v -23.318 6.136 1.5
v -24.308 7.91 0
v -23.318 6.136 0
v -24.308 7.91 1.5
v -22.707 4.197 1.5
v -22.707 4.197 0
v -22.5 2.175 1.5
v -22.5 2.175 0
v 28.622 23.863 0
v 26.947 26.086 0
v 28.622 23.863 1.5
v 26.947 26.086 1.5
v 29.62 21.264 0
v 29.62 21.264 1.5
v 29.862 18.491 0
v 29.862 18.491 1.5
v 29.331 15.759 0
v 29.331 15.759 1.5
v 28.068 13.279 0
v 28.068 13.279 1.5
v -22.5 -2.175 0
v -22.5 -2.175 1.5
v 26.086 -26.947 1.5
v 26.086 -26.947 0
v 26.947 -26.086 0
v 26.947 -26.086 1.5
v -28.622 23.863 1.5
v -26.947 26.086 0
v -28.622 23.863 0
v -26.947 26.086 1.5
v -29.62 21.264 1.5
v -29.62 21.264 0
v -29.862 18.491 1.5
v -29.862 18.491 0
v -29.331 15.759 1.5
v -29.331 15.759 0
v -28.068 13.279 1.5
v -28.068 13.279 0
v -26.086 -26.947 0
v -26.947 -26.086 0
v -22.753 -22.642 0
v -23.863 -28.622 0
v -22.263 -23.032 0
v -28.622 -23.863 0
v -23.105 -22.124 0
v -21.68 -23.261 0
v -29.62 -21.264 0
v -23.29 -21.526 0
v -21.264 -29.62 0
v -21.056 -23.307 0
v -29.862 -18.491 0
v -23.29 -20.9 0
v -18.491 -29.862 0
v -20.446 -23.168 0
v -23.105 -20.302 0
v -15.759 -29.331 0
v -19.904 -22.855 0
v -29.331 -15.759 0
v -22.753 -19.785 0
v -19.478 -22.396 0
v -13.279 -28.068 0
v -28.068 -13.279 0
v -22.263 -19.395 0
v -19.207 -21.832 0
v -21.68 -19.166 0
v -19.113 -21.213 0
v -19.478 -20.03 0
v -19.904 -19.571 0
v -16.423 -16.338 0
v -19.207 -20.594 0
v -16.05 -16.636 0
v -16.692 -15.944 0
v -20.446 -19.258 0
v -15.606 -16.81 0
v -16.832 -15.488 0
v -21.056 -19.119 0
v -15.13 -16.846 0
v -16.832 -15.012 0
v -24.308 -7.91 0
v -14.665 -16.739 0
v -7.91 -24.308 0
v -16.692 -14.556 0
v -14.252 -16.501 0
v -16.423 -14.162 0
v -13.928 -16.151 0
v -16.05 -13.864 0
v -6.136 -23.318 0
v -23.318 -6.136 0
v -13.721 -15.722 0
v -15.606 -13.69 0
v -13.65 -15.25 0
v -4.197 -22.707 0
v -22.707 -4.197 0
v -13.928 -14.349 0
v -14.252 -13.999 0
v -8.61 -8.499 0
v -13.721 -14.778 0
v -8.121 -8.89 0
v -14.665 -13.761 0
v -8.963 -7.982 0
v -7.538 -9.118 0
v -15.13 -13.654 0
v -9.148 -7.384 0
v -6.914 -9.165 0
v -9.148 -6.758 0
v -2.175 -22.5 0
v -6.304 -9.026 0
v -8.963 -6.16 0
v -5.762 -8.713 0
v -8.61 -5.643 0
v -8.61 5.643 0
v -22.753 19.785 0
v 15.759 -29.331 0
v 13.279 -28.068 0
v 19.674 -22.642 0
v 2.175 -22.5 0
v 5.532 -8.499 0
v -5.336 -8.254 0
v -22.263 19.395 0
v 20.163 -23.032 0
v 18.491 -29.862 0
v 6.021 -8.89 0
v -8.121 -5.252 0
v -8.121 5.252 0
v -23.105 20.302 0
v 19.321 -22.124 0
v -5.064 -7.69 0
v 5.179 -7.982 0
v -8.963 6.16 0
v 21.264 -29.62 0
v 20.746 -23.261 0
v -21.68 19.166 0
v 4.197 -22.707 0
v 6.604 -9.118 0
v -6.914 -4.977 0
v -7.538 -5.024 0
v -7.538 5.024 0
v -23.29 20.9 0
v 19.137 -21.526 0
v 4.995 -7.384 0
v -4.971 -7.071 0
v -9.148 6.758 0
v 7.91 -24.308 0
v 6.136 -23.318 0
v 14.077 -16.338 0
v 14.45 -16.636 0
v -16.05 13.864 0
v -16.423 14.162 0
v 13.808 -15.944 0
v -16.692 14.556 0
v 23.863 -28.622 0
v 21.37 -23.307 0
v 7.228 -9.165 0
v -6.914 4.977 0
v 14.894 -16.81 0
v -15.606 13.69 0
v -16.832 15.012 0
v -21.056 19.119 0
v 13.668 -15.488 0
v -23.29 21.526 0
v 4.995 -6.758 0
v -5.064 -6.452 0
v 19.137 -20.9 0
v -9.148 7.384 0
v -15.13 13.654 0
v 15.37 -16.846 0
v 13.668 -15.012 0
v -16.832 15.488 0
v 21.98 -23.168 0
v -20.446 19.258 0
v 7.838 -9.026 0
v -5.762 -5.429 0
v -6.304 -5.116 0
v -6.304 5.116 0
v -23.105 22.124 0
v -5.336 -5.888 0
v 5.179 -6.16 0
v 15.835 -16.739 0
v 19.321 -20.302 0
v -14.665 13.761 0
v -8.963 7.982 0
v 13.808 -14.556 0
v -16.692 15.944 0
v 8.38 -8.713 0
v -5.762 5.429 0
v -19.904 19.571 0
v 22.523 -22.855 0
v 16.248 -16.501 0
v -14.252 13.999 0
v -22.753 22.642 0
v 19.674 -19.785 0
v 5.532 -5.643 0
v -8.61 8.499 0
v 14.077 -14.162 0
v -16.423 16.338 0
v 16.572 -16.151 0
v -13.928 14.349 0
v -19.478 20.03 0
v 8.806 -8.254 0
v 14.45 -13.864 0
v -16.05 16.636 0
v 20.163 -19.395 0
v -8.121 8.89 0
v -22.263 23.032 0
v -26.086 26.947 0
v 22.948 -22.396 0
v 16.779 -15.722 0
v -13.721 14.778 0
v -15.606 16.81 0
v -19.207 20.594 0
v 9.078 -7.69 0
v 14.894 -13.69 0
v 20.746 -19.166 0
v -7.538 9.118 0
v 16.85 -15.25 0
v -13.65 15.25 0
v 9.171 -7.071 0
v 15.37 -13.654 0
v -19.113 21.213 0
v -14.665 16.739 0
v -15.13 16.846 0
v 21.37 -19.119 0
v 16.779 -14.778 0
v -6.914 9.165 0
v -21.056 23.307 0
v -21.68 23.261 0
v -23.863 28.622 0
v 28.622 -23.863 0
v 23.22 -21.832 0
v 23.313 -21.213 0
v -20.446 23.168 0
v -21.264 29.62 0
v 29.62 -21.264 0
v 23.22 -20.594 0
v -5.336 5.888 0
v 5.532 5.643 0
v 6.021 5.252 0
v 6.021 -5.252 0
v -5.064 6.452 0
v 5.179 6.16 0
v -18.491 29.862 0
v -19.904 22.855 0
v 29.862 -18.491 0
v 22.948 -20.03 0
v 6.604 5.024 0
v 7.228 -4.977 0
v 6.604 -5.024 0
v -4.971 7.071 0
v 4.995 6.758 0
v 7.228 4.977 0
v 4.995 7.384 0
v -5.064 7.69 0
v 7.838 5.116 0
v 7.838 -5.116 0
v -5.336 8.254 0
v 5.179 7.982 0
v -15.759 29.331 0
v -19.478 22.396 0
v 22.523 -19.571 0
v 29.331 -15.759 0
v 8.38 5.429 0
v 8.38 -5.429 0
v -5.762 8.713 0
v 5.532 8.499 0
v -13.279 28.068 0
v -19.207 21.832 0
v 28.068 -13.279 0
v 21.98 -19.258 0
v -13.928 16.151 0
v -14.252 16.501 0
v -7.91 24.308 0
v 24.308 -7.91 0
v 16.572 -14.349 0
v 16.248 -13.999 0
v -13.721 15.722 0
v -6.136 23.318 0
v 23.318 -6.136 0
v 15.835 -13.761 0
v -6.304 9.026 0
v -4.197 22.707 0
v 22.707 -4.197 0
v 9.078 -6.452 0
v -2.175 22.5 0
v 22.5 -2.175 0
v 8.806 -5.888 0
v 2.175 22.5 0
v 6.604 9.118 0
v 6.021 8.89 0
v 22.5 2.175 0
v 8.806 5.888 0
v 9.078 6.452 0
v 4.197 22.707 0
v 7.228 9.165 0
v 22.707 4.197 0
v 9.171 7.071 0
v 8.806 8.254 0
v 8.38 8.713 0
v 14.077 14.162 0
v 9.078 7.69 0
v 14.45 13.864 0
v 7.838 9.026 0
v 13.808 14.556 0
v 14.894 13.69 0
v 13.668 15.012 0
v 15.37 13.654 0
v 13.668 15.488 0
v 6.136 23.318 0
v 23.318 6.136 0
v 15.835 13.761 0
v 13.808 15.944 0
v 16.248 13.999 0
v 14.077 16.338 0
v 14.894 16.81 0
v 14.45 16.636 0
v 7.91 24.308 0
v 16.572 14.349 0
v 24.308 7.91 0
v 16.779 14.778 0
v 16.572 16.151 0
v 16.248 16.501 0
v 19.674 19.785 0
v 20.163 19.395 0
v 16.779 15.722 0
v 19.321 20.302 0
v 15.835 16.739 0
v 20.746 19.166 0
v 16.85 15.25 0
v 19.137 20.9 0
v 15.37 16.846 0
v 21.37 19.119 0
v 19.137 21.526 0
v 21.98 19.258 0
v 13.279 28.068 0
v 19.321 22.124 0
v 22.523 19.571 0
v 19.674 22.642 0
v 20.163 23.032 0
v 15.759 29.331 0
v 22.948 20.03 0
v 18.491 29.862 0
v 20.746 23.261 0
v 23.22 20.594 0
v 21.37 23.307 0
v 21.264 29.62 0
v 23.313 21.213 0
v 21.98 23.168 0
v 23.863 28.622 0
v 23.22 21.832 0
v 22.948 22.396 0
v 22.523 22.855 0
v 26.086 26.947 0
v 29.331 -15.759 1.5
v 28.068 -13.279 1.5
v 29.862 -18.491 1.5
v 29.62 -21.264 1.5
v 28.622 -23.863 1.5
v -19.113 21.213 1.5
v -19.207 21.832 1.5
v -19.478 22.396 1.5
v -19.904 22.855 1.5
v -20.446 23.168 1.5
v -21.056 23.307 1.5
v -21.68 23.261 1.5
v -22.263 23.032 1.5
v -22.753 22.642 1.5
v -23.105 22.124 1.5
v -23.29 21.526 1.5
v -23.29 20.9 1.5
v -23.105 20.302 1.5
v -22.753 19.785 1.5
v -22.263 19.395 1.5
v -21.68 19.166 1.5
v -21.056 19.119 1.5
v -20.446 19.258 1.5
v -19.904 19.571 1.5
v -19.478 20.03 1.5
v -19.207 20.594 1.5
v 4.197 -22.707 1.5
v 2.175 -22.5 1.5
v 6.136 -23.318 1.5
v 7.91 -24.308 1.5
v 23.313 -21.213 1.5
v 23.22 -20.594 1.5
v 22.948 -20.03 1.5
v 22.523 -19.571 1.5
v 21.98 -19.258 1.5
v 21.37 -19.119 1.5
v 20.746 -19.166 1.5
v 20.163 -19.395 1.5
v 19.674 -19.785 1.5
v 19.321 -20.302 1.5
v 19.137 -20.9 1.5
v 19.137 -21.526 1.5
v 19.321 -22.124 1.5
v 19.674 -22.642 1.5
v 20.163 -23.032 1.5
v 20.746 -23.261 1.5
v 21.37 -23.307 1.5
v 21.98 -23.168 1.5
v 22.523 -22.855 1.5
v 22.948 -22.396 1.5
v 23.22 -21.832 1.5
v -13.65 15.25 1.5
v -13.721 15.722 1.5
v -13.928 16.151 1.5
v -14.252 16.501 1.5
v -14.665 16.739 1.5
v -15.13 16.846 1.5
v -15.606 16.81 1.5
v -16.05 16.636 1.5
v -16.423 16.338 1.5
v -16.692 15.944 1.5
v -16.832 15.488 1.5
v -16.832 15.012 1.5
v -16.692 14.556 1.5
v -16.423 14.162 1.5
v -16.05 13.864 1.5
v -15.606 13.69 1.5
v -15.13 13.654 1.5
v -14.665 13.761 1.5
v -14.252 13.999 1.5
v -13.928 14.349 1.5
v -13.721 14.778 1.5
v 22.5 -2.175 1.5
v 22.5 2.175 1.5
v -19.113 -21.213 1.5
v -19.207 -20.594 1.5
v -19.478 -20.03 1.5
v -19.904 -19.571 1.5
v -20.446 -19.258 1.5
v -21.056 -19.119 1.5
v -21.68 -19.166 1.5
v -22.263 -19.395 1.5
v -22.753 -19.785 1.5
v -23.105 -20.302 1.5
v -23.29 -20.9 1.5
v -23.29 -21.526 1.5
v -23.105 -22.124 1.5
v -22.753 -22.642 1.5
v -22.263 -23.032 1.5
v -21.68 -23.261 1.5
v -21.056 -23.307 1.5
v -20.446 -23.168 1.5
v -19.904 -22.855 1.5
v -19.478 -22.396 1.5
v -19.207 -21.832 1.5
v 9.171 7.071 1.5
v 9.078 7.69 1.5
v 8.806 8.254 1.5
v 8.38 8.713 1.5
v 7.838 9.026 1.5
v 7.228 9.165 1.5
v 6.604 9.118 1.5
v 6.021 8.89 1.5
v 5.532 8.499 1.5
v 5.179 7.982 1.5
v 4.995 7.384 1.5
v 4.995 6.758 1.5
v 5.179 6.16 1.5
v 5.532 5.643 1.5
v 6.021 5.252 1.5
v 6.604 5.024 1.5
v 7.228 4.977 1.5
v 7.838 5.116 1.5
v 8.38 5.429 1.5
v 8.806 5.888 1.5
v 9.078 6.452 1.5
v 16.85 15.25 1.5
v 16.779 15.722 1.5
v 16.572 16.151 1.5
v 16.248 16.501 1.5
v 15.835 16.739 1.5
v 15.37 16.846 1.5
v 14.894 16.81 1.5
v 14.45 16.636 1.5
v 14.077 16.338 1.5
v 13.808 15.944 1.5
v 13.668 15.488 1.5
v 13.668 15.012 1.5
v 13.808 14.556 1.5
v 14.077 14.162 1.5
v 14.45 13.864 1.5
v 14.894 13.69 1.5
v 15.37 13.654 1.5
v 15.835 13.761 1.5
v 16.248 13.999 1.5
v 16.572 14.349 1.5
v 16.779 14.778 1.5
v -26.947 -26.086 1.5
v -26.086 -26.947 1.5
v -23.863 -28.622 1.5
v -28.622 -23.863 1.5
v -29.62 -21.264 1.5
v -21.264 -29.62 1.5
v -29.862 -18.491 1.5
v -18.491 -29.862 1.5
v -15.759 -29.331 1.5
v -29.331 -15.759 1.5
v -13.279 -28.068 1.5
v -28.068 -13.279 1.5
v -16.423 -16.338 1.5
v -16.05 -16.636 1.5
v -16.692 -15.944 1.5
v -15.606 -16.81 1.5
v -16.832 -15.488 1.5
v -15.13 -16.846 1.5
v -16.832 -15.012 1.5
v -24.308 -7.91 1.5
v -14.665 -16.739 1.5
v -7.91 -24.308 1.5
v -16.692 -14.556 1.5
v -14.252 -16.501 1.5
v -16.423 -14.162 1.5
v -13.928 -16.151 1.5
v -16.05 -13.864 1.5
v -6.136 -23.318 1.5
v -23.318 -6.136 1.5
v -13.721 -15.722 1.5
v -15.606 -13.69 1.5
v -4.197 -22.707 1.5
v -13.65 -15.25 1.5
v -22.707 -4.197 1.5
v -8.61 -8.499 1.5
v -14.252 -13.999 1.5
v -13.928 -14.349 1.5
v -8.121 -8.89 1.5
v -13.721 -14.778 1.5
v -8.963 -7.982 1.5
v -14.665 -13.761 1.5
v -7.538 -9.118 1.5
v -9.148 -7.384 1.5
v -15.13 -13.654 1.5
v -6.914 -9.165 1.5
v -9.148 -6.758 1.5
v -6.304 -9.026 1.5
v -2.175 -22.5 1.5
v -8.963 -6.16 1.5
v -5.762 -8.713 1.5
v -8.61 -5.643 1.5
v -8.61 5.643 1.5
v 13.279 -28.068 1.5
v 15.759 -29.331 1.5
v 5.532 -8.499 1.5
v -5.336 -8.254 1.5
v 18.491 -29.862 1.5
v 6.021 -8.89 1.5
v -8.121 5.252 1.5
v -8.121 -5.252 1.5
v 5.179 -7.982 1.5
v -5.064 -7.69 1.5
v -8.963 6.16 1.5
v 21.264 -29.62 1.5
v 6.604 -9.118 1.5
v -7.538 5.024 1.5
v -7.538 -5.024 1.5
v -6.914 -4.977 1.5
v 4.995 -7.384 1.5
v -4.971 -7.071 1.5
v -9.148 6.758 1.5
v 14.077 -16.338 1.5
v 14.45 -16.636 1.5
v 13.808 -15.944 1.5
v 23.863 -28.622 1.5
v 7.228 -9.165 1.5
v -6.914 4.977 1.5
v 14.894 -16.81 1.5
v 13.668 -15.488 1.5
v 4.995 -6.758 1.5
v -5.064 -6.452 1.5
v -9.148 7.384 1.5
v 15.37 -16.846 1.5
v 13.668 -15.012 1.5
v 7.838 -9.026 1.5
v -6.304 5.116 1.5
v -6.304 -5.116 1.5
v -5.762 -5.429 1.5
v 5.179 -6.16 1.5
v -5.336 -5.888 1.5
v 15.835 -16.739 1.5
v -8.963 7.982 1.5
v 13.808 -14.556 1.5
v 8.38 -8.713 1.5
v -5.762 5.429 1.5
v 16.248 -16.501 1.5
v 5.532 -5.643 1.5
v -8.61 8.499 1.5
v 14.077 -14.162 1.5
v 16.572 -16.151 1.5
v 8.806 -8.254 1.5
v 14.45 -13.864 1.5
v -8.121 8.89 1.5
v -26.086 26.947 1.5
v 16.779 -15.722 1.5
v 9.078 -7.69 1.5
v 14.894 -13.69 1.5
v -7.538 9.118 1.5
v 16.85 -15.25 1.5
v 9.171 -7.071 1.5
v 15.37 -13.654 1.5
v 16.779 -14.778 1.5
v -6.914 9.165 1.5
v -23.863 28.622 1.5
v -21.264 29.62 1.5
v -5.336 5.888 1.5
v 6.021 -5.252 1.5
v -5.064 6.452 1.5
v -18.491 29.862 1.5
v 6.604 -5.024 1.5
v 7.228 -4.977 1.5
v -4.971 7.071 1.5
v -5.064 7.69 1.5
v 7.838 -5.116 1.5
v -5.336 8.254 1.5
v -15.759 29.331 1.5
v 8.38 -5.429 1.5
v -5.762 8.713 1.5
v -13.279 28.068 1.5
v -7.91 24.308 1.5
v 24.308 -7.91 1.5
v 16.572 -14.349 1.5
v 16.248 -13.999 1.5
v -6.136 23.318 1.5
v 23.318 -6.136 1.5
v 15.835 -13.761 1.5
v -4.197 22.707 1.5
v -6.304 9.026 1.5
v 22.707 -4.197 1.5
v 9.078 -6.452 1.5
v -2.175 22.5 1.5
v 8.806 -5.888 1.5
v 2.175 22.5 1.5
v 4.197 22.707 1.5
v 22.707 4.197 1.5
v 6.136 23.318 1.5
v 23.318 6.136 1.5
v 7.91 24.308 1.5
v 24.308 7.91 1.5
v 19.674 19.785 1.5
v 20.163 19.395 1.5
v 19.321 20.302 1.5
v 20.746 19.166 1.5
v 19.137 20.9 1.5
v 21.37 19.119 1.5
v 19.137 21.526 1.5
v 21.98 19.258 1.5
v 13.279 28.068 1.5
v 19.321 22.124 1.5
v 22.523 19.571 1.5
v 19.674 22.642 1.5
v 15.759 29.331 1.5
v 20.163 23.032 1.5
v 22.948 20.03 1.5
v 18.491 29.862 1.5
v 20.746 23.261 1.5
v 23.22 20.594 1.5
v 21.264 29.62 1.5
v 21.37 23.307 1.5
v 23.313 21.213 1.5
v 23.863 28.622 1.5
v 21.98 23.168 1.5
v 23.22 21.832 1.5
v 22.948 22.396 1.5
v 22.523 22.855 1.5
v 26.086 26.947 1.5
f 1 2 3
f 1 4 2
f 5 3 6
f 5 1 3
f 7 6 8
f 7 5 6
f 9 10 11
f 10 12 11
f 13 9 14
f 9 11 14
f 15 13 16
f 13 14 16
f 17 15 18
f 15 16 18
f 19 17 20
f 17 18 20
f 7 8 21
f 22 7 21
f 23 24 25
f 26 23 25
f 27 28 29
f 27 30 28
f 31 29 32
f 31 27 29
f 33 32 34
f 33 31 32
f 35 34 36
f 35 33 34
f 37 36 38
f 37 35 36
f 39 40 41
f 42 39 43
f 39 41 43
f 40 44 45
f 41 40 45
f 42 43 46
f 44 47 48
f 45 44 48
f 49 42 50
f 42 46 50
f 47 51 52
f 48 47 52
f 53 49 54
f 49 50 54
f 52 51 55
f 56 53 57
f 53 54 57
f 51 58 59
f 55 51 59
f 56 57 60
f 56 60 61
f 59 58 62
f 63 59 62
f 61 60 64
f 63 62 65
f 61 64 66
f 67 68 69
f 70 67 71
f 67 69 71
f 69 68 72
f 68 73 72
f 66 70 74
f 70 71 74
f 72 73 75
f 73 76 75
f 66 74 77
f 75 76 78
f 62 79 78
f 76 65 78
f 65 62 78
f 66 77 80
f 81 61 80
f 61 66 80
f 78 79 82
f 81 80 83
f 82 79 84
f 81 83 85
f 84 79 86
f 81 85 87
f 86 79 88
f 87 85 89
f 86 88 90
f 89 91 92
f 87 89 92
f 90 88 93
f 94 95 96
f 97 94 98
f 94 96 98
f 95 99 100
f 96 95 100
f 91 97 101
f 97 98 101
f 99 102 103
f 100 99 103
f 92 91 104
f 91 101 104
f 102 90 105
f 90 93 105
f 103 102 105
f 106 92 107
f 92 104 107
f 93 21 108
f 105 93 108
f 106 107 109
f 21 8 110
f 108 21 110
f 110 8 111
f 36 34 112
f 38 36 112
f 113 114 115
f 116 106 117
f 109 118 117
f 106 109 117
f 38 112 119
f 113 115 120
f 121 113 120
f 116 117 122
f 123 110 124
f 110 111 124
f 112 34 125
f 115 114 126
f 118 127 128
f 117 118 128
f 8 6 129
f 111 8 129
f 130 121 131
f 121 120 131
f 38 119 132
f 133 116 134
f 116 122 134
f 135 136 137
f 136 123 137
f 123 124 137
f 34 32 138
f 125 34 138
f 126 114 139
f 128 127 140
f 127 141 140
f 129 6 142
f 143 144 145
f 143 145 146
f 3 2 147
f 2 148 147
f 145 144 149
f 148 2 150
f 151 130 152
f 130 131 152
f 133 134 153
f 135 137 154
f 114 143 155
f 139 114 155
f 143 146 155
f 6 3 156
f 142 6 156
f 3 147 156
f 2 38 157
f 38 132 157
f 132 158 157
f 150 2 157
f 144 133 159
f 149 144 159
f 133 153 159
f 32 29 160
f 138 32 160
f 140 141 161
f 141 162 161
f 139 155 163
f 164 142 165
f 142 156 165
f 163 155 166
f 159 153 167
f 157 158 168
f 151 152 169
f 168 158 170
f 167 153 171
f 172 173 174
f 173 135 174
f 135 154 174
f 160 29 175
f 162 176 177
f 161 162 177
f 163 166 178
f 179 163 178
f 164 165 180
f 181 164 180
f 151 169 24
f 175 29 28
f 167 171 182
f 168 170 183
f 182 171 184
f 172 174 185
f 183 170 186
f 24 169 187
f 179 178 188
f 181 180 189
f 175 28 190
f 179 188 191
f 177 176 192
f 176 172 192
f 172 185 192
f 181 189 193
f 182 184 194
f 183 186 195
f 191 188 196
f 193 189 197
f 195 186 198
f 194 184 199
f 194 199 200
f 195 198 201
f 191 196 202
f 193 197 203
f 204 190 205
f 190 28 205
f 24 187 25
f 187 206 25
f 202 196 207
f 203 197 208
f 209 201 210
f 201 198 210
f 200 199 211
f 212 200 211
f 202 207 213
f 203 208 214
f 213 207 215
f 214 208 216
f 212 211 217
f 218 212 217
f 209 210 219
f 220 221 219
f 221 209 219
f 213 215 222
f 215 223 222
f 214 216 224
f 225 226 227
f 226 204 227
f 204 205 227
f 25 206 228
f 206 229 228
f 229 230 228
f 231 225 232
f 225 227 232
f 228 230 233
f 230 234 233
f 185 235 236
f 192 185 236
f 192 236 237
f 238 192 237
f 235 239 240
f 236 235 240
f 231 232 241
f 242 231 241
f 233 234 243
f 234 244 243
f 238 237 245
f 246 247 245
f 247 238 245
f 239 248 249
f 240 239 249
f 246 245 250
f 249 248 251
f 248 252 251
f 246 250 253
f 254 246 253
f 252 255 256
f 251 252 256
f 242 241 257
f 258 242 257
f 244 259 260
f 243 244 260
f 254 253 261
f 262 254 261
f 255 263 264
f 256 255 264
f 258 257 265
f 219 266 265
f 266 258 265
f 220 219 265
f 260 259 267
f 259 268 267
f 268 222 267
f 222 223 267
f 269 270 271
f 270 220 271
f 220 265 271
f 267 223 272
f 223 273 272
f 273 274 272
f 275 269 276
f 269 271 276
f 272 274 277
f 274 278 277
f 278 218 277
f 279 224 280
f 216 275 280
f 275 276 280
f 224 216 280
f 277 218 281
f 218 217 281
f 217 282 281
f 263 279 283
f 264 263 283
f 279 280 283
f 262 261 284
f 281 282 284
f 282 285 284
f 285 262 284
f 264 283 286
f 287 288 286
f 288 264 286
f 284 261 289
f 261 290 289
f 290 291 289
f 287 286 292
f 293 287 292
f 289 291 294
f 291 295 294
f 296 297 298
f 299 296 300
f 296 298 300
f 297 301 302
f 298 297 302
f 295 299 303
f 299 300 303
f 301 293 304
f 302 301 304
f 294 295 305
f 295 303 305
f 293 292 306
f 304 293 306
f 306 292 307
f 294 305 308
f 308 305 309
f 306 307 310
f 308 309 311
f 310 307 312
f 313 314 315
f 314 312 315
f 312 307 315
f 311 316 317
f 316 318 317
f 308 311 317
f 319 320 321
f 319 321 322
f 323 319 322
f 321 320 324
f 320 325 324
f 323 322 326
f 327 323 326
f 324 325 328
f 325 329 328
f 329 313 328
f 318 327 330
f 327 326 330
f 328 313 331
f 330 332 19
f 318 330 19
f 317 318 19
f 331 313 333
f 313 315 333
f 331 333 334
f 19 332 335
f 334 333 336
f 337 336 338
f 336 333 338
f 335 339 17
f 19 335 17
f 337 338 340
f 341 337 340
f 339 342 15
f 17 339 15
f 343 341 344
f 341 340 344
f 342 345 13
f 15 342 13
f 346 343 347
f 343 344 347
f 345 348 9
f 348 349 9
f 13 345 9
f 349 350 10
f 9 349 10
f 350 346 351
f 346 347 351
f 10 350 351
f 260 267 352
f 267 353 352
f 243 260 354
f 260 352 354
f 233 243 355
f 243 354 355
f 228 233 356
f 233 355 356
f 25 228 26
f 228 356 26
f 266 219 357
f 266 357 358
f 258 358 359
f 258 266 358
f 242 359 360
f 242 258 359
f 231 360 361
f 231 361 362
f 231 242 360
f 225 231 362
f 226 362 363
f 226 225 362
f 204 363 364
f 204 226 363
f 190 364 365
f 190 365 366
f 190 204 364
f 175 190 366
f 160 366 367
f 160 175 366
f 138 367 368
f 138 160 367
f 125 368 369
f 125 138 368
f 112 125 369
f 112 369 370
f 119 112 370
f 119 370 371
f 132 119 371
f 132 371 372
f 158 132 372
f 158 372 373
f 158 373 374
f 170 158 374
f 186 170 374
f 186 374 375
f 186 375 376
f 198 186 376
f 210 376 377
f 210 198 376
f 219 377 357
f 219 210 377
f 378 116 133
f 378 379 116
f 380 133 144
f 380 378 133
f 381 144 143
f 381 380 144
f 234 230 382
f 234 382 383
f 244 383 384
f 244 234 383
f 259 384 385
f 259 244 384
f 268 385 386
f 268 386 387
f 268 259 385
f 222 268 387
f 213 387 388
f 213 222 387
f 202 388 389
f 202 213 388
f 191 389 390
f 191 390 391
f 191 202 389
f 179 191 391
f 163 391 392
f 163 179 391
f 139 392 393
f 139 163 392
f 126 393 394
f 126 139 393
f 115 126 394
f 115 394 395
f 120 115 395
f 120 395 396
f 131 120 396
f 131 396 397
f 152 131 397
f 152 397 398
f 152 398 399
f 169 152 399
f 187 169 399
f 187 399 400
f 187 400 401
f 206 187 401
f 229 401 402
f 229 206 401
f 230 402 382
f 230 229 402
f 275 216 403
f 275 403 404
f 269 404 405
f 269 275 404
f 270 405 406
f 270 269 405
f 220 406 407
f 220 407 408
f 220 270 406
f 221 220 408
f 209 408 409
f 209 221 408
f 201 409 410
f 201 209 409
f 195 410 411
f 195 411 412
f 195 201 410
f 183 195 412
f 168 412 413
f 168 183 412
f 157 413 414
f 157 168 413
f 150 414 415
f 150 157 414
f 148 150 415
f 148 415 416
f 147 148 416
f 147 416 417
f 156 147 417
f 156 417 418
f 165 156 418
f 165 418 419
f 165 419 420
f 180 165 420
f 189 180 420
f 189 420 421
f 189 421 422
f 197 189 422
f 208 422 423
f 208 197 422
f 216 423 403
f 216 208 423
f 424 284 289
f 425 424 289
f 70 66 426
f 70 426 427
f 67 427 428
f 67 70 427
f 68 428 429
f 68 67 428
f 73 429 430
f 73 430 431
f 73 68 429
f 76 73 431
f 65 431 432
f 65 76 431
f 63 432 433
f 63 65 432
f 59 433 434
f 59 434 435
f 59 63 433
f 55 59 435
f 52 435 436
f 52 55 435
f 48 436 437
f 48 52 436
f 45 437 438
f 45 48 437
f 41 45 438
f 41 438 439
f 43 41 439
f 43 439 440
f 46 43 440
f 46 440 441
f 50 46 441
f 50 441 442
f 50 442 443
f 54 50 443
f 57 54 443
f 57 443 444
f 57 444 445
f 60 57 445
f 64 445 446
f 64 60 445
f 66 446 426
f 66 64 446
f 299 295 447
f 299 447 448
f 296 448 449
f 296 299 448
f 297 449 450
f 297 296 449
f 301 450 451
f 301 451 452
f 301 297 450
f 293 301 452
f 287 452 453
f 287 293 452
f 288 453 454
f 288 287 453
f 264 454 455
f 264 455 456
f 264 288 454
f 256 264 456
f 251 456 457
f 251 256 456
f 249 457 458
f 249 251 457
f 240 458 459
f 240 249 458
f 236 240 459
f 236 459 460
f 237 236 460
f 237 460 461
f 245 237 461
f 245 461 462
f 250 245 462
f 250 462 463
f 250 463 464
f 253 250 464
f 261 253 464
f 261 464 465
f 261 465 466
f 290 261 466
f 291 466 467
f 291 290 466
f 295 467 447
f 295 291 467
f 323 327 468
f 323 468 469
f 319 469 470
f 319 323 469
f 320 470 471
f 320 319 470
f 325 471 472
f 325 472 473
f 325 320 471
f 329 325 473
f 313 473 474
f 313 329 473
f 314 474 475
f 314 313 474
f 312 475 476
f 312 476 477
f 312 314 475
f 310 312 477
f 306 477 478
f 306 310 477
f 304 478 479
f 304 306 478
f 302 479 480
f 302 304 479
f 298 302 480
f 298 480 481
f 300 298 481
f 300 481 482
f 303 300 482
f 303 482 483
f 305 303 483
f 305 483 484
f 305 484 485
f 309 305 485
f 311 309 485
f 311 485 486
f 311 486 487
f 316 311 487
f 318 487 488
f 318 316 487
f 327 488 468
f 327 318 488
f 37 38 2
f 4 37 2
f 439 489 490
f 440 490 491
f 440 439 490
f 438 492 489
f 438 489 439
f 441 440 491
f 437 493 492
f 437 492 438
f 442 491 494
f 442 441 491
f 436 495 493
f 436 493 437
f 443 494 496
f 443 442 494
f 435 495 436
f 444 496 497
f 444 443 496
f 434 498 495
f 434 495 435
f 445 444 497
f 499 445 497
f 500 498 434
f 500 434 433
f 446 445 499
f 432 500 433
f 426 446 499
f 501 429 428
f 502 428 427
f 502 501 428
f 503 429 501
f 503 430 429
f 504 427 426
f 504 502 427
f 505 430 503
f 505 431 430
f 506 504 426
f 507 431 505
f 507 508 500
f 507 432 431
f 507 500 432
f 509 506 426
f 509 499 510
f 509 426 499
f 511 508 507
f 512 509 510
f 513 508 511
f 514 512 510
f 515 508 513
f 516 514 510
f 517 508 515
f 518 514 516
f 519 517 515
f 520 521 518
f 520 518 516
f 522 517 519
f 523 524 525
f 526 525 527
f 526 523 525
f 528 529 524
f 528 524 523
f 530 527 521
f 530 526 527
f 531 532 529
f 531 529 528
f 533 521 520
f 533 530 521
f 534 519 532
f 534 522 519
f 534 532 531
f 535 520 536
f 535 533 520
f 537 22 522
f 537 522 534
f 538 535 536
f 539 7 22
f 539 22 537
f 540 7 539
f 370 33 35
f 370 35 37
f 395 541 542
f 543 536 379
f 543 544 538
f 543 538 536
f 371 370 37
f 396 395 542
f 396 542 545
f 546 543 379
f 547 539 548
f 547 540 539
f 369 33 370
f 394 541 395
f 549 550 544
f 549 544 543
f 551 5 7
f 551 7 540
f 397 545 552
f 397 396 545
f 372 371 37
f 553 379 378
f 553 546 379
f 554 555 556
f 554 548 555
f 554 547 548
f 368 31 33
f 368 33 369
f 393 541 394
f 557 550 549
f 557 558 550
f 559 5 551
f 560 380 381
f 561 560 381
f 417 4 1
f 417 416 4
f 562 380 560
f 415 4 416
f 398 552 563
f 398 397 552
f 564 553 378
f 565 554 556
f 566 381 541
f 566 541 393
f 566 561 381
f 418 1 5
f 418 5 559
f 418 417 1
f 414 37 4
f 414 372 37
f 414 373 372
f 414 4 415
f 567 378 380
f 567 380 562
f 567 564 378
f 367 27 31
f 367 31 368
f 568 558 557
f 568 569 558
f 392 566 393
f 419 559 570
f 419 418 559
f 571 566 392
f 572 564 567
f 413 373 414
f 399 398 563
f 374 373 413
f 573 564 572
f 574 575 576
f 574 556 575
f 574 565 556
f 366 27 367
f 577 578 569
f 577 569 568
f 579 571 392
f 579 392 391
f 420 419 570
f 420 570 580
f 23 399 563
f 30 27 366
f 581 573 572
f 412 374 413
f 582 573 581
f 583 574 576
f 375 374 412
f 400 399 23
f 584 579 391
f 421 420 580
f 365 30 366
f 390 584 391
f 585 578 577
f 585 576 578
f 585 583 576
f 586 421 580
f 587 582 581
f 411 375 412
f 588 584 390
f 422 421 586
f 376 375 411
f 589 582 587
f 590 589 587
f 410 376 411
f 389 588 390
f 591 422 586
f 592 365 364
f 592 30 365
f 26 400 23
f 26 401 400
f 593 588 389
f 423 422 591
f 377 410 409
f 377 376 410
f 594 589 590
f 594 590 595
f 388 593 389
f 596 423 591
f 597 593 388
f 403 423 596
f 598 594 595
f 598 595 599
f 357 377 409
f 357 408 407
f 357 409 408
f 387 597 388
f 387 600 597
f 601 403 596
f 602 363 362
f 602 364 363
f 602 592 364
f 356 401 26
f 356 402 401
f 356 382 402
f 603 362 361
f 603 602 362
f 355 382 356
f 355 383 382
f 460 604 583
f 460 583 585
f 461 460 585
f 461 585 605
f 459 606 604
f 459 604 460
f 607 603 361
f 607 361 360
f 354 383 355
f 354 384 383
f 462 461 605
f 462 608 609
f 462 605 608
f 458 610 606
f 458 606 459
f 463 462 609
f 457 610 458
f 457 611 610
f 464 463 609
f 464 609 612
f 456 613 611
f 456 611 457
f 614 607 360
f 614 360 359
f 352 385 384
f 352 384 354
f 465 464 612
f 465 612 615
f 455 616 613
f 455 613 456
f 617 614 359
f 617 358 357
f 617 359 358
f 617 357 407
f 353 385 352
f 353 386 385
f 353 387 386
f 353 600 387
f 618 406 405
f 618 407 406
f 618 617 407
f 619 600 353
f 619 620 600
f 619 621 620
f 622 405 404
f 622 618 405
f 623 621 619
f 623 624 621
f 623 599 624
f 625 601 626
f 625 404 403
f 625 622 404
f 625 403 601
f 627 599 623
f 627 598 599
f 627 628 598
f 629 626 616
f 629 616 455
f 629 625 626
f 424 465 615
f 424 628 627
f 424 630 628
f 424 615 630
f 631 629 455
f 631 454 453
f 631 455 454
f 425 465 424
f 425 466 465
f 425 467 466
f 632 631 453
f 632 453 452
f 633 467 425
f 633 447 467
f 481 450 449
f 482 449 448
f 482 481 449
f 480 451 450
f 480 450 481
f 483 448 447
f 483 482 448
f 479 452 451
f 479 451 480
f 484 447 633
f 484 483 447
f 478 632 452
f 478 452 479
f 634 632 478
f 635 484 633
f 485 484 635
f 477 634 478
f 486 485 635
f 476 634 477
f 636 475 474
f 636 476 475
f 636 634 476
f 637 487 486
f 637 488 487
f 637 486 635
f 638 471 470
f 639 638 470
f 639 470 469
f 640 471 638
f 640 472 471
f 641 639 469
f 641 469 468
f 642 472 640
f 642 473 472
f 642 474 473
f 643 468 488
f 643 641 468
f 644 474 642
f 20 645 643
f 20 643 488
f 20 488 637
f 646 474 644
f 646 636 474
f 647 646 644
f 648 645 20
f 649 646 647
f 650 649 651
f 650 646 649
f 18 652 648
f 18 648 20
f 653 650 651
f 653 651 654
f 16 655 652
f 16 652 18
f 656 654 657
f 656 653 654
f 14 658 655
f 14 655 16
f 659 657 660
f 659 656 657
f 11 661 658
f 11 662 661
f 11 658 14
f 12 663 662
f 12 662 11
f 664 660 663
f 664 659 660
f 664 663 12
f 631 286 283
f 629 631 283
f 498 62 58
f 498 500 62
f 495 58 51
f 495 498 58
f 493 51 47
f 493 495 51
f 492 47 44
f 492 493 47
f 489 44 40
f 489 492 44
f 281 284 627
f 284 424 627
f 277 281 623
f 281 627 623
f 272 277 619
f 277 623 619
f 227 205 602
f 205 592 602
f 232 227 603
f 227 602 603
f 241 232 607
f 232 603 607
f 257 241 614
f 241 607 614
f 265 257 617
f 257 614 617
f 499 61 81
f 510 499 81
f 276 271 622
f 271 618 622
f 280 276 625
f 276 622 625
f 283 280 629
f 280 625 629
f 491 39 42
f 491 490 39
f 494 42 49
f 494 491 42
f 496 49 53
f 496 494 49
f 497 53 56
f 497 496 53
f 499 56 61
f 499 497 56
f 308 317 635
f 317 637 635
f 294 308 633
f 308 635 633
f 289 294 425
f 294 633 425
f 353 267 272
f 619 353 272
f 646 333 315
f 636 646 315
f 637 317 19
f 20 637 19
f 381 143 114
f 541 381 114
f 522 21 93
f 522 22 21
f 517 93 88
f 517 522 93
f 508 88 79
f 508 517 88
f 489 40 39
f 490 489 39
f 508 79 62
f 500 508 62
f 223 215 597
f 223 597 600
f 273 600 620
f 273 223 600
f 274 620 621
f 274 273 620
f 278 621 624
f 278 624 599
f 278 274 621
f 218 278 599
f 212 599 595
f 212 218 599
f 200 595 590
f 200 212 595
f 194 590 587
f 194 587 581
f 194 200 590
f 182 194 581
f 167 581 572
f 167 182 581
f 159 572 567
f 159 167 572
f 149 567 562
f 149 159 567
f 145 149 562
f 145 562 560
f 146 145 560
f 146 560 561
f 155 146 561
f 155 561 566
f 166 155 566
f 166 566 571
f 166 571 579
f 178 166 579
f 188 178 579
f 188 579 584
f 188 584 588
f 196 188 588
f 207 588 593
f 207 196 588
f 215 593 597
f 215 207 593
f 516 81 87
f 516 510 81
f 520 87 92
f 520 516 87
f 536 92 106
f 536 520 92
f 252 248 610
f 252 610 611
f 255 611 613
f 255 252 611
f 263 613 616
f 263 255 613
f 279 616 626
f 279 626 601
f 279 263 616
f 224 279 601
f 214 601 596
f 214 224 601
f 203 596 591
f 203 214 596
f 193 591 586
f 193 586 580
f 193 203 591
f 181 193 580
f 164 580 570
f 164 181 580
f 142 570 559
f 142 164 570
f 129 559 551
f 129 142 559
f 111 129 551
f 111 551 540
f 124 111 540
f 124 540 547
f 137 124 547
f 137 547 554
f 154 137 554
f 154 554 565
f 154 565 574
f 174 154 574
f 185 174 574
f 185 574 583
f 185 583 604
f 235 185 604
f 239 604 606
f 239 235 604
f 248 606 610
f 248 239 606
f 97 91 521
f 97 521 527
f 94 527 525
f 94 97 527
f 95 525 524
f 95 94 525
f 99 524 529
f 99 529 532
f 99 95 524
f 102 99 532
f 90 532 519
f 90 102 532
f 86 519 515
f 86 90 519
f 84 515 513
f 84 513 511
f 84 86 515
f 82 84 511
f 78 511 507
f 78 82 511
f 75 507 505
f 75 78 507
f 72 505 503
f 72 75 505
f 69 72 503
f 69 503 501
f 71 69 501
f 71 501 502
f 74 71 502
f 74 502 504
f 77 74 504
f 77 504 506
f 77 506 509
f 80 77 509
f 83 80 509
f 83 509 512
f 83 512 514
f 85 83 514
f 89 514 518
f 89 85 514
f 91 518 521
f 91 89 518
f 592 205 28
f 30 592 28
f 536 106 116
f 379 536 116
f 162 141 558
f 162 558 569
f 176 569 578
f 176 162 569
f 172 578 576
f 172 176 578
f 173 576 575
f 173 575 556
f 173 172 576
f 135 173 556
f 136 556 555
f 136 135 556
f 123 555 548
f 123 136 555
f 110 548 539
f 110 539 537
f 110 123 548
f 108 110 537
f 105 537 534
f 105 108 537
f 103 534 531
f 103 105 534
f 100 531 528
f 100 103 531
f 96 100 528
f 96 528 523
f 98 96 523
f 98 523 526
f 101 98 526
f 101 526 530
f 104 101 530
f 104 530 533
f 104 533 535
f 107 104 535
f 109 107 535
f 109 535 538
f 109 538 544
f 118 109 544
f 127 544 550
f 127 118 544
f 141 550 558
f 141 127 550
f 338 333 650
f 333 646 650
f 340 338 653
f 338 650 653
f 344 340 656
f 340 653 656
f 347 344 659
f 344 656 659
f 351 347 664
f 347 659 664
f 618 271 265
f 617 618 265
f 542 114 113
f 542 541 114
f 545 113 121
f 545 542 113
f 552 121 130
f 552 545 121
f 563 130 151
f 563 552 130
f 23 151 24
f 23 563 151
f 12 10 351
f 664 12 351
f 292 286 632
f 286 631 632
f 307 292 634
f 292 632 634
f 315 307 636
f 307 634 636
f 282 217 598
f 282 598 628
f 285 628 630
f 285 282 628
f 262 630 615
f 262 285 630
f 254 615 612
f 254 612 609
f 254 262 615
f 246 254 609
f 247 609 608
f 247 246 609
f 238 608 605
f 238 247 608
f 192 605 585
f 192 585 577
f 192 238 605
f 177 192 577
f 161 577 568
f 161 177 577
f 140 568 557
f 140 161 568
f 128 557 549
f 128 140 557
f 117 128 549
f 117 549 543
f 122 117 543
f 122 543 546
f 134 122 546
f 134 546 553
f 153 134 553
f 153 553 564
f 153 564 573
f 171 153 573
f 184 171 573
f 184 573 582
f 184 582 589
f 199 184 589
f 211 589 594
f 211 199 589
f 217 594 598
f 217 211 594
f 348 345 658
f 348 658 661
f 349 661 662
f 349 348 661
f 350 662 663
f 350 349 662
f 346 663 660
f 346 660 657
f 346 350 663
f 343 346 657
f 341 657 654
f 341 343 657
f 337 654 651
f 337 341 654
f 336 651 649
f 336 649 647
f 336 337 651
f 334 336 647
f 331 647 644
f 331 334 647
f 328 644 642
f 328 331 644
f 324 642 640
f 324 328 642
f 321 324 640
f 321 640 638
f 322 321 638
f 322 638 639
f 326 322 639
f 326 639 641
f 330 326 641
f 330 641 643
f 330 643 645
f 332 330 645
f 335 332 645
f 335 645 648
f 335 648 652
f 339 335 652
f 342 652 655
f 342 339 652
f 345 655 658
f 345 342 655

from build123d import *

# Parameters (mm, degrees)
F0_R     = 2.1
F0_R_2   = 1.6
F1_DEPTH = 1.5
F2_R     = 10


with BuildPart() as f1:
    # F0 (on Top) → F1 (new body)
    with BuildSketch(Plane.XY):
        Polygon((-20.152543, 32.880465), (-32.880465, 20.152543), (-22.5, 5.327702), (-22.5, -5.327702), (-32.880465, -20.152543), (-20.152543, -32.880465), (-5.327702, -22.5), (5.327702, -22.5), (20.152543, -32.880465), (32.880465, -20.152543), (22.5, -5.327702), (22.5, 5.327702), (32.880465, 20.152543), (20.152543, 32.880465), (5.327702, 22.5), (-5.327702, 22.5), align=None)
        with Locations((-21.213203, -21.213203)):
            Circle(F0_R, mode=Mode.SUBTRACT)
        with Locations((-15.25, -15.25)):
            Circle(F0_R_2, mode=Mode.SUBTRACT)
        with Locations((-7.071068, -7.071068)):
            Circle(F0_R, mode=Mode.SUBTRACT)
        with Locations((21.213203, -21.213203)):
            Circle(F0_R, mode=Mode.SUBTRACT)
        with Locations((15.25, -15.25)):
            Circle(F0_R_2, mode=Mode.SUBTRACT)
        with Locations((7.071068, -7.071068)):
            Circle(F0_R, mode=Mode.SUBTRACT)
        with Locations((-7.071068, 7.071068)):
            Circle(F0_R, mode=Mode.SUBTRACT)
        with Locations((-15.25, 15.25)):
            Circle(F0_R_2, mode=Mode.SUBTRACT)
        with Locations((-21.213203, 21.213203)):
            Circle(F0_R, mode=Mode.SUBTRACT)
        with Locations((7.071068, 7.071068)):
            Circle(F0_R, mode=Mode.SUBTRACT)
        with Locations((15.25, 15.25)):
            Circle(F0_R_2, mode=Mode.SUBTRACT)
        with Locations((21.213203, 21.213203)):
            Circle(F0_R, mode=Mode.SUBTRACT)
    extrude(amount=F1_DEPTH)

    # F2
    f2_edges = [f1.edges().sort_by_distance(p)[0] for p in [
        (-32.880465, 20.152543, 0.75),
        (-22.5, 5.327702, 0.75),
        (-22.5, -5.327702, 0.75),
        (-32.880465, -20.152543, 0.75),
        (-20.152543, -32.880465, 0.75),
        (-5.327702, -22.5, 0.75),
        (5.327702, -22.5, 0.75),
        (20.152543, -32.880465, 0.75),
        (32.880465, -20.152543, 0.75),
        (22.5, -5.327702, 0.75),
        (22.5, 5.327702, 0.75),
        (32.880465, 20.152543, 0.75),
        (-20.152543, 32.880465, 0.75),
        (20.152543, 32.880465, 0.75),
        (5.327702, 22.5, 0.75),
        (-5.327702, 22.5, 0.75),
    ]]
    fillet(f2_edges, radius=F2_R)


solid = f1.part
